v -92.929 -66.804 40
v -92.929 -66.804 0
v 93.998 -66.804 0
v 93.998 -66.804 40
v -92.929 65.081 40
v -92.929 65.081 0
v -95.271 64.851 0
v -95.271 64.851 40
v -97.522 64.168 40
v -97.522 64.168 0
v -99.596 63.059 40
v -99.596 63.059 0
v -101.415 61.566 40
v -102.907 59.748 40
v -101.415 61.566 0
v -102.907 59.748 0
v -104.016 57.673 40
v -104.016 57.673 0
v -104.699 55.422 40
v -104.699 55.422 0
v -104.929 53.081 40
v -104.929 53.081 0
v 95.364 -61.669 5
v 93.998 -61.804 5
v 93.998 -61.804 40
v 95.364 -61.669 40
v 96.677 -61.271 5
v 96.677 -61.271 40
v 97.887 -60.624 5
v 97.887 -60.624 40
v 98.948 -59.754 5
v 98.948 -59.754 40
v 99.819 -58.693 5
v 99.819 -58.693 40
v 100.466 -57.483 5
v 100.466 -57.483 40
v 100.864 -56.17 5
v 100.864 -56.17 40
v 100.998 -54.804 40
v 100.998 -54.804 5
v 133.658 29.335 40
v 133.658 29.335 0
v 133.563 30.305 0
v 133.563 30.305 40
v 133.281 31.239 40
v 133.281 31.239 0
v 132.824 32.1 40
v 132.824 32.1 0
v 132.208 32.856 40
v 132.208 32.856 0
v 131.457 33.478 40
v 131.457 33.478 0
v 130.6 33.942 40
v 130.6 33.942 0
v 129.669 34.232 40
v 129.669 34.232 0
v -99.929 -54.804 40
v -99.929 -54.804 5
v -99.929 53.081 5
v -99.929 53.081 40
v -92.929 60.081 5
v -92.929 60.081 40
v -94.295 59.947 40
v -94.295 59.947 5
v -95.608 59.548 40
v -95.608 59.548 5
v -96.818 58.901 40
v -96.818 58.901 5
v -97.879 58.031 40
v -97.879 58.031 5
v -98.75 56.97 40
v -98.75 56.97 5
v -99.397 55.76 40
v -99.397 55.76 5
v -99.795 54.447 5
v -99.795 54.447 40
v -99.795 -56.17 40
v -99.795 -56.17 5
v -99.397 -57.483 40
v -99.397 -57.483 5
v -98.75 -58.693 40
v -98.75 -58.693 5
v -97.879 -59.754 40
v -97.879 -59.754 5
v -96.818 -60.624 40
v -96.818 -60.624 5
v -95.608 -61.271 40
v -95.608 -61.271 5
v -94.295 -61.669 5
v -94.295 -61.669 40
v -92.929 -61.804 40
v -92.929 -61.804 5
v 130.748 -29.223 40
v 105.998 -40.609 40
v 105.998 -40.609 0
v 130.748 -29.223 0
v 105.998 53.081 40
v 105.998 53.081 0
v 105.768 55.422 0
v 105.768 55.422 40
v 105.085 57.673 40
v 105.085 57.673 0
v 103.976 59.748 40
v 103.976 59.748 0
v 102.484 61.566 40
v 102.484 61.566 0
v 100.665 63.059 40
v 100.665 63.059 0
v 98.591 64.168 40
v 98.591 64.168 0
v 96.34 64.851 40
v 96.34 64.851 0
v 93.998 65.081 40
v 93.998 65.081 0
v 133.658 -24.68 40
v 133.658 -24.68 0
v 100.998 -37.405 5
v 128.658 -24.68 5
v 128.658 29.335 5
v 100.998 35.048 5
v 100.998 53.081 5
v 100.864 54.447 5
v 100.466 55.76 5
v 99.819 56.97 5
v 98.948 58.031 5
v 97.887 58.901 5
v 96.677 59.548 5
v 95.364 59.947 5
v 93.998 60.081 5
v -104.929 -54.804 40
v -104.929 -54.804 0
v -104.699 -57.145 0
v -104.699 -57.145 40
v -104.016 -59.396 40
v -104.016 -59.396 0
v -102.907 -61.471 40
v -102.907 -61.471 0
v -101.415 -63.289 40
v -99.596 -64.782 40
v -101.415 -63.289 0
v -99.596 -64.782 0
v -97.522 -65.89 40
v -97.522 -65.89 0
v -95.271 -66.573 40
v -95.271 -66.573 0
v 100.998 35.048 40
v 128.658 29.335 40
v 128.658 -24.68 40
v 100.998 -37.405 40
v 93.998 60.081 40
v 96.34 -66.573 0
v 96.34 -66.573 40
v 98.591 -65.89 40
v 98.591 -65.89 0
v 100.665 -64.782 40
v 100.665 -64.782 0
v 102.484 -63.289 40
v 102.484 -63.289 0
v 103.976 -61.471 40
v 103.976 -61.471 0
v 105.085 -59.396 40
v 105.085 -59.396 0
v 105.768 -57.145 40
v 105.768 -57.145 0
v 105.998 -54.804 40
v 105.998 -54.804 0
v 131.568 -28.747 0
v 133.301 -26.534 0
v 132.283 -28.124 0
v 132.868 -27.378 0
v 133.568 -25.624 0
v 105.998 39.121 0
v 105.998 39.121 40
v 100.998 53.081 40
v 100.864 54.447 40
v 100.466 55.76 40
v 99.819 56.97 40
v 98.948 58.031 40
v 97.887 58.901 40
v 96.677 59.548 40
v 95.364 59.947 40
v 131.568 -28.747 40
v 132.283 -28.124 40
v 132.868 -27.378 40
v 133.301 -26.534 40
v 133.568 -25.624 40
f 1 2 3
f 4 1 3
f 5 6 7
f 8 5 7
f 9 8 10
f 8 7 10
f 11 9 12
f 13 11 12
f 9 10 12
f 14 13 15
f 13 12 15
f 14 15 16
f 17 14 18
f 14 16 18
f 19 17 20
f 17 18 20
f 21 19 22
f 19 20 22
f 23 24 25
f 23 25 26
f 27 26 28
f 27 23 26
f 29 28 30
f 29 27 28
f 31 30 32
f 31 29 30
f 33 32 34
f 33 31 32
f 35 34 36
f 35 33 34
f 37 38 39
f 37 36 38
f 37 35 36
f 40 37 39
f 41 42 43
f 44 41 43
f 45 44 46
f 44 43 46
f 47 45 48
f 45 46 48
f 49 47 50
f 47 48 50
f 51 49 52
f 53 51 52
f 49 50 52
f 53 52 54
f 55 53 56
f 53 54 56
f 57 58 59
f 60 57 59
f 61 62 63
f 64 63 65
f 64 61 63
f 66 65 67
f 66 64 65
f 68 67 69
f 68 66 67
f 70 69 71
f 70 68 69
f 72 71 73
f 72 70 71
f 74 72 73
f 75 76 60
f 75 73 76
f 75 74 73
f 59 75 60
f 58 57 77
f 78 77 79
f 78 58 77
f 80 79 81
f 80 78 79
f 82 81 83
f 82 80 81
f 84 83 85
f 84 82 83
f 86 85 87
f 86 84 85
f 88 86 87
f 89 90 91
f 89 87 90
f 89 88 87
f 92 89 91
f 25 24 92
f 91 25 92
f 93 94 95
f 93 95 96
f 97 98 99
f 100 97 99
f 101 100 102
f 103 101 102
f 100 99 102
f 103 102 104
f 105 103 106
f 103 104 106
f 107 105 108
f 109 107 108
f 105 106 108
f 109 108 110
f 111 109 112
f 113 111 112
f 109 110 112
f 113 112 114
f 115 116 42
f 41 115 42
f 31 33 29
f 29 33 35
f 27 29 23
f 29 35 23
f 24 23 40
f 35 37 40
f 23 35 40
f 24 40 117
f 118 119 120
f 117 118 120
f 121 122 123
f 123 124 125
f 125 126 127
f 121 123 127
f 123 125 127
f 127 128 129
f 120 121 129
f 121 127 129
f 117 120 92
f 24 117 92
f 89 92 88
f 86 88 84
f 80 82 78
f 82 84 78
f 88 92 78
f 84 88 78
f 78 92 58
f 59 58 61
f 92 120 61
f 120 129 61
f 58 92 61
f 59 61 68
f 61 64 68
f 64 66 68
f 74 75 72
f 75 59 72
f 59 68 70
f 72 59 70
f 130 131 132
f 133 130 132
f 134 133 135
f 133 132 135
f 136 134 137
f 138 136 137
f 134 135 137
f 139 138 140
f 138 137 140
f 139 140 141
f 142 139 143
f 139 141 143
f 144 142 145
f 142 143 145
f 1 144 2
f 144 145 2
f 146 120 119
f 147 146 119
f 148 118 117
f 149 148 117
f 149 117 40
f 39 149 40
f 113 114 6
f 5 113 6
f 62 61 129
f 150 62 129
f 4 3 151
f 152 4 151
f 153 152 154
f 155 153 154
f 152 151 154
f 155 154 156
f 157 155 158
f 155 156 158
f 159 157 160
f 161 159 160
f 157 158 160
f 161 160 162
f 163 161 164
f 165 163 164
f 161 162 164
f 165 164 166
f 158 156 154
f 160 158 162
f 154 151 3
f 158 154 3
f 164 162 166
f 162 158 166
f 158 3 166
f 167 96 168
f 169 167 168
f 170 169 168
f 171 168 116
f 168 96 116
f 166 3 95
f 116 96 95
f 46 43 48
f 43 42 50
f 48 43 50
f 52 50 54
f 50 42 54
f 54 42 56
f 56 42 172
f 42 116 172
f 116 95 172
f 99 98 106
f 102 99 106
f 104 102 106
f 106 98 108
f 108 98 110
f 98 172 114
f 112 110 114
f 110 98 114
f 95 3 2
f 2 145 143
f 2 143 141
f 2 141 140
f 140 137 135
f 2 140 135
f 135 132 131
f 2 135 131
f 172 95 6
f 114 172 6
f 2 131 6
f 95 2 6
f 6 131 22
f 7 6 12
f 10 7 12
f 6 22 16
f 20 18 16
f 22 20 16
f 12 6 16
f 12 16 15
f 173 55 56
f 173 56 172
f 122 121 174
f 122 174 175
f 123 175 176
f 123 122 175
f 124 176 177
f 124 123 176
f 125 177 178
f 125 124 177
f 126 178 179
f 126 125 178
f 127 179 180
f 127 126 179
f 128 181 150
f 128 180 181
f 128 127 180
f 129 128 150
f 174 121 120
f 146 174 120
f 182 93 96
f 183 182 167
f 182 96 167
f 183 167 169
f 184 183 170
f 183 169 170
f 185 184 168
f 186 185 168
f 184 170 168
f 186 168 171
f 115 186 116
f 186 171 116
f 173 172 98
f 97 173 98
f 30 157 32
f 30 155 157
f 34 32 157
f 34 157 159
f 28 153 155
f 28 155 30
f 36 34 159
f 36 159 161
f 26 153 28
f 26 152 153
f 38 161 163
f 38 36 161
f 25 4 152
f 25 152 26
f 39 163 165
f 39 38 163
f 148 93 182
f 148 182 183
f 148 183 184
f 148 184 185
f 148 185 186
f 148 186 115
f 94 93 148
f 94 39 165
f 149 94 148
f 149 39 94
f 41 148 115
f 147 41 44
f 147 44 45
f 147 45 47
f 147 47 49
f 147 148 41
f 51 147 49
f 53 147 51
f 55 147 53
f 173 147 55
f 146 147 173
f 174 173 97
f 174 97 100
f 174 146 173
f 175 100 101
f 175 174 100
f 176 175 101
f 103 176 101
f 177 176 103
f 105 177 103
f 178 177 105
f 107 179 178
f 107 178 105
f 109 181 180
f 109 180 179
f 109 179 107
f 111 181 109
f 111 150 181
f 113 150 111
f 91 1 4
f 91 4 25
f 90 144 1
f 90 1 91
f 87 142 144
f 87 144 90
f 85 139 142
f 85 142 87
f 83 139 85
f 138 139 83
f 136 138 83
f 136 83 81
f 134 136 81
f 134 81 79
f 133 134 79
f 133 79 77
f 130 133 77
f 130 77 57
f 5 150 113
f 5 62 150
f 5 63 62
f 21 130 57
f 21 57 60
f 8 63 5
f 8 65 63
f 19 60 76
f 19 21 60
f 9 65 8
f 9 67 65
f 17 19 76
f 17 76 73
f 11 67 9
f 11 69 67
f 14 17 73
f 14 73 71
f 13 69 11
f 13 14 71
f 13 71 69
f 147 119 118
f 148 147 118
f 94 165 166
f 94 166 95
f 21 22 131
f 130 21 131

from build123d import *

# Parameters (mm, degrees)
EXTRUDE_DEPTH    = 40
EXTRUDE001_DEPTH = 40


with BuildPart() as extrude_body:
    # Sketch → Extrude (new body)
    with BuildSketch(Plane.XY):
        with BuildLine():
            Line((-92.929424, 60.081154), (93.998491, 60.081154))
            ThreePointArc((100.998491, 53.081154), (98.948238, 58.030901), (93.998491, 60.081154))
            Line((100.998491, 53.081154), (100.998491, 35.048241))
            Line((100.998491, 35.048241), (128.657806, 29.335068))
            Line((128.657806, 29.335068), (128.657806, -24.680387))
            Line((128.657806, -24.680387), (100.998491, -37.405182))
            Line((100.998491, -37.405182), (100.998491, -54.803909))
            ThreePointArc((93.998491, -61.803909), (98.948238, -59.753656), (100.998491, -54.803909))
            Line((93.998491, -61.803909), (-92.929424, -61.803909))
            ThreePointArc((-99.929424, -54.803909), (-97.879172, -59.753656), (-92.929424, -61.803909))
            Line((-99.929424, -54.803909), (-99.929424, 53.081154))
            ThreePointArc((-92.929424, 60.081154), (-97.879172, 58.030901), (-99.929424, 53.081154))
        make_face()
    extrude(amount=EXTRUDE_DEPTH)


with BuildPart() as extrude_body_1:
    # Extrude placement: moved
    add(extrude_body.part.moved(Location((0, 0, 5))))


with BuildPart() as bottom:
    # Offset2D → Extrude001 (new body)
    with BuildSketch(Plane(origin=(14.364191, -0.861378, 0), x_dir=(0, 1, 0), z_dir=(0, 0, 1))):
        with BuildLine():
            Line((53.942531, 119.293615), (-53.942531, 119.293615))
            ThreePointArc((-53.942531, 119.293615), (-62.427812, 115.778897), (-65.942531, 107.293615))
            Line((-65.942531, 107.293615), (-65.942531, -79.6343))
            ThreePointArc((-65.942531, -79.6343), (-62.427812, -88.119581), (-53.942531, -91.6343))
            Line((-53.942531, -91.6343), (-39.74728, -91.6343))
            Line((-39.74728, -91.6343), (-28.361368, -116.383348))
            ThreePointArc((-28.361368, -116.383348), (-26.516354, -118.503643), (-23.819009, -119.293615))
            Line((-23.819009, -119.293615), (30.196446, -119.293615))
            ThreePointArc((30.196446, -119.293615), (33.354204, -118.170284), (35.093079, -115.30504))
            Line((35.093079, -115.30504), (39.982392, -91.6343))
            Line((39.982392, -91.6343), (53.942531, -91.6343))
            ThreePointArc((53.942531, -91.6343), (62.427812, -88.119581), (65.942531, -79.6343))
            Line((65.942531, -79.6343), (65.942531, 107.293615))
            ThreePointArc((65.942531, 107.293615), (62.427812, 115.778897), (53.942531, 119.293615))
        make_face()
    extrude(amount=EXTRUDE001_DEPTH)

    # Cut: cut Extrude body
    add(extrude_body_1.part, mode=Mode.SUBTRACT)


solid = bottom.part
